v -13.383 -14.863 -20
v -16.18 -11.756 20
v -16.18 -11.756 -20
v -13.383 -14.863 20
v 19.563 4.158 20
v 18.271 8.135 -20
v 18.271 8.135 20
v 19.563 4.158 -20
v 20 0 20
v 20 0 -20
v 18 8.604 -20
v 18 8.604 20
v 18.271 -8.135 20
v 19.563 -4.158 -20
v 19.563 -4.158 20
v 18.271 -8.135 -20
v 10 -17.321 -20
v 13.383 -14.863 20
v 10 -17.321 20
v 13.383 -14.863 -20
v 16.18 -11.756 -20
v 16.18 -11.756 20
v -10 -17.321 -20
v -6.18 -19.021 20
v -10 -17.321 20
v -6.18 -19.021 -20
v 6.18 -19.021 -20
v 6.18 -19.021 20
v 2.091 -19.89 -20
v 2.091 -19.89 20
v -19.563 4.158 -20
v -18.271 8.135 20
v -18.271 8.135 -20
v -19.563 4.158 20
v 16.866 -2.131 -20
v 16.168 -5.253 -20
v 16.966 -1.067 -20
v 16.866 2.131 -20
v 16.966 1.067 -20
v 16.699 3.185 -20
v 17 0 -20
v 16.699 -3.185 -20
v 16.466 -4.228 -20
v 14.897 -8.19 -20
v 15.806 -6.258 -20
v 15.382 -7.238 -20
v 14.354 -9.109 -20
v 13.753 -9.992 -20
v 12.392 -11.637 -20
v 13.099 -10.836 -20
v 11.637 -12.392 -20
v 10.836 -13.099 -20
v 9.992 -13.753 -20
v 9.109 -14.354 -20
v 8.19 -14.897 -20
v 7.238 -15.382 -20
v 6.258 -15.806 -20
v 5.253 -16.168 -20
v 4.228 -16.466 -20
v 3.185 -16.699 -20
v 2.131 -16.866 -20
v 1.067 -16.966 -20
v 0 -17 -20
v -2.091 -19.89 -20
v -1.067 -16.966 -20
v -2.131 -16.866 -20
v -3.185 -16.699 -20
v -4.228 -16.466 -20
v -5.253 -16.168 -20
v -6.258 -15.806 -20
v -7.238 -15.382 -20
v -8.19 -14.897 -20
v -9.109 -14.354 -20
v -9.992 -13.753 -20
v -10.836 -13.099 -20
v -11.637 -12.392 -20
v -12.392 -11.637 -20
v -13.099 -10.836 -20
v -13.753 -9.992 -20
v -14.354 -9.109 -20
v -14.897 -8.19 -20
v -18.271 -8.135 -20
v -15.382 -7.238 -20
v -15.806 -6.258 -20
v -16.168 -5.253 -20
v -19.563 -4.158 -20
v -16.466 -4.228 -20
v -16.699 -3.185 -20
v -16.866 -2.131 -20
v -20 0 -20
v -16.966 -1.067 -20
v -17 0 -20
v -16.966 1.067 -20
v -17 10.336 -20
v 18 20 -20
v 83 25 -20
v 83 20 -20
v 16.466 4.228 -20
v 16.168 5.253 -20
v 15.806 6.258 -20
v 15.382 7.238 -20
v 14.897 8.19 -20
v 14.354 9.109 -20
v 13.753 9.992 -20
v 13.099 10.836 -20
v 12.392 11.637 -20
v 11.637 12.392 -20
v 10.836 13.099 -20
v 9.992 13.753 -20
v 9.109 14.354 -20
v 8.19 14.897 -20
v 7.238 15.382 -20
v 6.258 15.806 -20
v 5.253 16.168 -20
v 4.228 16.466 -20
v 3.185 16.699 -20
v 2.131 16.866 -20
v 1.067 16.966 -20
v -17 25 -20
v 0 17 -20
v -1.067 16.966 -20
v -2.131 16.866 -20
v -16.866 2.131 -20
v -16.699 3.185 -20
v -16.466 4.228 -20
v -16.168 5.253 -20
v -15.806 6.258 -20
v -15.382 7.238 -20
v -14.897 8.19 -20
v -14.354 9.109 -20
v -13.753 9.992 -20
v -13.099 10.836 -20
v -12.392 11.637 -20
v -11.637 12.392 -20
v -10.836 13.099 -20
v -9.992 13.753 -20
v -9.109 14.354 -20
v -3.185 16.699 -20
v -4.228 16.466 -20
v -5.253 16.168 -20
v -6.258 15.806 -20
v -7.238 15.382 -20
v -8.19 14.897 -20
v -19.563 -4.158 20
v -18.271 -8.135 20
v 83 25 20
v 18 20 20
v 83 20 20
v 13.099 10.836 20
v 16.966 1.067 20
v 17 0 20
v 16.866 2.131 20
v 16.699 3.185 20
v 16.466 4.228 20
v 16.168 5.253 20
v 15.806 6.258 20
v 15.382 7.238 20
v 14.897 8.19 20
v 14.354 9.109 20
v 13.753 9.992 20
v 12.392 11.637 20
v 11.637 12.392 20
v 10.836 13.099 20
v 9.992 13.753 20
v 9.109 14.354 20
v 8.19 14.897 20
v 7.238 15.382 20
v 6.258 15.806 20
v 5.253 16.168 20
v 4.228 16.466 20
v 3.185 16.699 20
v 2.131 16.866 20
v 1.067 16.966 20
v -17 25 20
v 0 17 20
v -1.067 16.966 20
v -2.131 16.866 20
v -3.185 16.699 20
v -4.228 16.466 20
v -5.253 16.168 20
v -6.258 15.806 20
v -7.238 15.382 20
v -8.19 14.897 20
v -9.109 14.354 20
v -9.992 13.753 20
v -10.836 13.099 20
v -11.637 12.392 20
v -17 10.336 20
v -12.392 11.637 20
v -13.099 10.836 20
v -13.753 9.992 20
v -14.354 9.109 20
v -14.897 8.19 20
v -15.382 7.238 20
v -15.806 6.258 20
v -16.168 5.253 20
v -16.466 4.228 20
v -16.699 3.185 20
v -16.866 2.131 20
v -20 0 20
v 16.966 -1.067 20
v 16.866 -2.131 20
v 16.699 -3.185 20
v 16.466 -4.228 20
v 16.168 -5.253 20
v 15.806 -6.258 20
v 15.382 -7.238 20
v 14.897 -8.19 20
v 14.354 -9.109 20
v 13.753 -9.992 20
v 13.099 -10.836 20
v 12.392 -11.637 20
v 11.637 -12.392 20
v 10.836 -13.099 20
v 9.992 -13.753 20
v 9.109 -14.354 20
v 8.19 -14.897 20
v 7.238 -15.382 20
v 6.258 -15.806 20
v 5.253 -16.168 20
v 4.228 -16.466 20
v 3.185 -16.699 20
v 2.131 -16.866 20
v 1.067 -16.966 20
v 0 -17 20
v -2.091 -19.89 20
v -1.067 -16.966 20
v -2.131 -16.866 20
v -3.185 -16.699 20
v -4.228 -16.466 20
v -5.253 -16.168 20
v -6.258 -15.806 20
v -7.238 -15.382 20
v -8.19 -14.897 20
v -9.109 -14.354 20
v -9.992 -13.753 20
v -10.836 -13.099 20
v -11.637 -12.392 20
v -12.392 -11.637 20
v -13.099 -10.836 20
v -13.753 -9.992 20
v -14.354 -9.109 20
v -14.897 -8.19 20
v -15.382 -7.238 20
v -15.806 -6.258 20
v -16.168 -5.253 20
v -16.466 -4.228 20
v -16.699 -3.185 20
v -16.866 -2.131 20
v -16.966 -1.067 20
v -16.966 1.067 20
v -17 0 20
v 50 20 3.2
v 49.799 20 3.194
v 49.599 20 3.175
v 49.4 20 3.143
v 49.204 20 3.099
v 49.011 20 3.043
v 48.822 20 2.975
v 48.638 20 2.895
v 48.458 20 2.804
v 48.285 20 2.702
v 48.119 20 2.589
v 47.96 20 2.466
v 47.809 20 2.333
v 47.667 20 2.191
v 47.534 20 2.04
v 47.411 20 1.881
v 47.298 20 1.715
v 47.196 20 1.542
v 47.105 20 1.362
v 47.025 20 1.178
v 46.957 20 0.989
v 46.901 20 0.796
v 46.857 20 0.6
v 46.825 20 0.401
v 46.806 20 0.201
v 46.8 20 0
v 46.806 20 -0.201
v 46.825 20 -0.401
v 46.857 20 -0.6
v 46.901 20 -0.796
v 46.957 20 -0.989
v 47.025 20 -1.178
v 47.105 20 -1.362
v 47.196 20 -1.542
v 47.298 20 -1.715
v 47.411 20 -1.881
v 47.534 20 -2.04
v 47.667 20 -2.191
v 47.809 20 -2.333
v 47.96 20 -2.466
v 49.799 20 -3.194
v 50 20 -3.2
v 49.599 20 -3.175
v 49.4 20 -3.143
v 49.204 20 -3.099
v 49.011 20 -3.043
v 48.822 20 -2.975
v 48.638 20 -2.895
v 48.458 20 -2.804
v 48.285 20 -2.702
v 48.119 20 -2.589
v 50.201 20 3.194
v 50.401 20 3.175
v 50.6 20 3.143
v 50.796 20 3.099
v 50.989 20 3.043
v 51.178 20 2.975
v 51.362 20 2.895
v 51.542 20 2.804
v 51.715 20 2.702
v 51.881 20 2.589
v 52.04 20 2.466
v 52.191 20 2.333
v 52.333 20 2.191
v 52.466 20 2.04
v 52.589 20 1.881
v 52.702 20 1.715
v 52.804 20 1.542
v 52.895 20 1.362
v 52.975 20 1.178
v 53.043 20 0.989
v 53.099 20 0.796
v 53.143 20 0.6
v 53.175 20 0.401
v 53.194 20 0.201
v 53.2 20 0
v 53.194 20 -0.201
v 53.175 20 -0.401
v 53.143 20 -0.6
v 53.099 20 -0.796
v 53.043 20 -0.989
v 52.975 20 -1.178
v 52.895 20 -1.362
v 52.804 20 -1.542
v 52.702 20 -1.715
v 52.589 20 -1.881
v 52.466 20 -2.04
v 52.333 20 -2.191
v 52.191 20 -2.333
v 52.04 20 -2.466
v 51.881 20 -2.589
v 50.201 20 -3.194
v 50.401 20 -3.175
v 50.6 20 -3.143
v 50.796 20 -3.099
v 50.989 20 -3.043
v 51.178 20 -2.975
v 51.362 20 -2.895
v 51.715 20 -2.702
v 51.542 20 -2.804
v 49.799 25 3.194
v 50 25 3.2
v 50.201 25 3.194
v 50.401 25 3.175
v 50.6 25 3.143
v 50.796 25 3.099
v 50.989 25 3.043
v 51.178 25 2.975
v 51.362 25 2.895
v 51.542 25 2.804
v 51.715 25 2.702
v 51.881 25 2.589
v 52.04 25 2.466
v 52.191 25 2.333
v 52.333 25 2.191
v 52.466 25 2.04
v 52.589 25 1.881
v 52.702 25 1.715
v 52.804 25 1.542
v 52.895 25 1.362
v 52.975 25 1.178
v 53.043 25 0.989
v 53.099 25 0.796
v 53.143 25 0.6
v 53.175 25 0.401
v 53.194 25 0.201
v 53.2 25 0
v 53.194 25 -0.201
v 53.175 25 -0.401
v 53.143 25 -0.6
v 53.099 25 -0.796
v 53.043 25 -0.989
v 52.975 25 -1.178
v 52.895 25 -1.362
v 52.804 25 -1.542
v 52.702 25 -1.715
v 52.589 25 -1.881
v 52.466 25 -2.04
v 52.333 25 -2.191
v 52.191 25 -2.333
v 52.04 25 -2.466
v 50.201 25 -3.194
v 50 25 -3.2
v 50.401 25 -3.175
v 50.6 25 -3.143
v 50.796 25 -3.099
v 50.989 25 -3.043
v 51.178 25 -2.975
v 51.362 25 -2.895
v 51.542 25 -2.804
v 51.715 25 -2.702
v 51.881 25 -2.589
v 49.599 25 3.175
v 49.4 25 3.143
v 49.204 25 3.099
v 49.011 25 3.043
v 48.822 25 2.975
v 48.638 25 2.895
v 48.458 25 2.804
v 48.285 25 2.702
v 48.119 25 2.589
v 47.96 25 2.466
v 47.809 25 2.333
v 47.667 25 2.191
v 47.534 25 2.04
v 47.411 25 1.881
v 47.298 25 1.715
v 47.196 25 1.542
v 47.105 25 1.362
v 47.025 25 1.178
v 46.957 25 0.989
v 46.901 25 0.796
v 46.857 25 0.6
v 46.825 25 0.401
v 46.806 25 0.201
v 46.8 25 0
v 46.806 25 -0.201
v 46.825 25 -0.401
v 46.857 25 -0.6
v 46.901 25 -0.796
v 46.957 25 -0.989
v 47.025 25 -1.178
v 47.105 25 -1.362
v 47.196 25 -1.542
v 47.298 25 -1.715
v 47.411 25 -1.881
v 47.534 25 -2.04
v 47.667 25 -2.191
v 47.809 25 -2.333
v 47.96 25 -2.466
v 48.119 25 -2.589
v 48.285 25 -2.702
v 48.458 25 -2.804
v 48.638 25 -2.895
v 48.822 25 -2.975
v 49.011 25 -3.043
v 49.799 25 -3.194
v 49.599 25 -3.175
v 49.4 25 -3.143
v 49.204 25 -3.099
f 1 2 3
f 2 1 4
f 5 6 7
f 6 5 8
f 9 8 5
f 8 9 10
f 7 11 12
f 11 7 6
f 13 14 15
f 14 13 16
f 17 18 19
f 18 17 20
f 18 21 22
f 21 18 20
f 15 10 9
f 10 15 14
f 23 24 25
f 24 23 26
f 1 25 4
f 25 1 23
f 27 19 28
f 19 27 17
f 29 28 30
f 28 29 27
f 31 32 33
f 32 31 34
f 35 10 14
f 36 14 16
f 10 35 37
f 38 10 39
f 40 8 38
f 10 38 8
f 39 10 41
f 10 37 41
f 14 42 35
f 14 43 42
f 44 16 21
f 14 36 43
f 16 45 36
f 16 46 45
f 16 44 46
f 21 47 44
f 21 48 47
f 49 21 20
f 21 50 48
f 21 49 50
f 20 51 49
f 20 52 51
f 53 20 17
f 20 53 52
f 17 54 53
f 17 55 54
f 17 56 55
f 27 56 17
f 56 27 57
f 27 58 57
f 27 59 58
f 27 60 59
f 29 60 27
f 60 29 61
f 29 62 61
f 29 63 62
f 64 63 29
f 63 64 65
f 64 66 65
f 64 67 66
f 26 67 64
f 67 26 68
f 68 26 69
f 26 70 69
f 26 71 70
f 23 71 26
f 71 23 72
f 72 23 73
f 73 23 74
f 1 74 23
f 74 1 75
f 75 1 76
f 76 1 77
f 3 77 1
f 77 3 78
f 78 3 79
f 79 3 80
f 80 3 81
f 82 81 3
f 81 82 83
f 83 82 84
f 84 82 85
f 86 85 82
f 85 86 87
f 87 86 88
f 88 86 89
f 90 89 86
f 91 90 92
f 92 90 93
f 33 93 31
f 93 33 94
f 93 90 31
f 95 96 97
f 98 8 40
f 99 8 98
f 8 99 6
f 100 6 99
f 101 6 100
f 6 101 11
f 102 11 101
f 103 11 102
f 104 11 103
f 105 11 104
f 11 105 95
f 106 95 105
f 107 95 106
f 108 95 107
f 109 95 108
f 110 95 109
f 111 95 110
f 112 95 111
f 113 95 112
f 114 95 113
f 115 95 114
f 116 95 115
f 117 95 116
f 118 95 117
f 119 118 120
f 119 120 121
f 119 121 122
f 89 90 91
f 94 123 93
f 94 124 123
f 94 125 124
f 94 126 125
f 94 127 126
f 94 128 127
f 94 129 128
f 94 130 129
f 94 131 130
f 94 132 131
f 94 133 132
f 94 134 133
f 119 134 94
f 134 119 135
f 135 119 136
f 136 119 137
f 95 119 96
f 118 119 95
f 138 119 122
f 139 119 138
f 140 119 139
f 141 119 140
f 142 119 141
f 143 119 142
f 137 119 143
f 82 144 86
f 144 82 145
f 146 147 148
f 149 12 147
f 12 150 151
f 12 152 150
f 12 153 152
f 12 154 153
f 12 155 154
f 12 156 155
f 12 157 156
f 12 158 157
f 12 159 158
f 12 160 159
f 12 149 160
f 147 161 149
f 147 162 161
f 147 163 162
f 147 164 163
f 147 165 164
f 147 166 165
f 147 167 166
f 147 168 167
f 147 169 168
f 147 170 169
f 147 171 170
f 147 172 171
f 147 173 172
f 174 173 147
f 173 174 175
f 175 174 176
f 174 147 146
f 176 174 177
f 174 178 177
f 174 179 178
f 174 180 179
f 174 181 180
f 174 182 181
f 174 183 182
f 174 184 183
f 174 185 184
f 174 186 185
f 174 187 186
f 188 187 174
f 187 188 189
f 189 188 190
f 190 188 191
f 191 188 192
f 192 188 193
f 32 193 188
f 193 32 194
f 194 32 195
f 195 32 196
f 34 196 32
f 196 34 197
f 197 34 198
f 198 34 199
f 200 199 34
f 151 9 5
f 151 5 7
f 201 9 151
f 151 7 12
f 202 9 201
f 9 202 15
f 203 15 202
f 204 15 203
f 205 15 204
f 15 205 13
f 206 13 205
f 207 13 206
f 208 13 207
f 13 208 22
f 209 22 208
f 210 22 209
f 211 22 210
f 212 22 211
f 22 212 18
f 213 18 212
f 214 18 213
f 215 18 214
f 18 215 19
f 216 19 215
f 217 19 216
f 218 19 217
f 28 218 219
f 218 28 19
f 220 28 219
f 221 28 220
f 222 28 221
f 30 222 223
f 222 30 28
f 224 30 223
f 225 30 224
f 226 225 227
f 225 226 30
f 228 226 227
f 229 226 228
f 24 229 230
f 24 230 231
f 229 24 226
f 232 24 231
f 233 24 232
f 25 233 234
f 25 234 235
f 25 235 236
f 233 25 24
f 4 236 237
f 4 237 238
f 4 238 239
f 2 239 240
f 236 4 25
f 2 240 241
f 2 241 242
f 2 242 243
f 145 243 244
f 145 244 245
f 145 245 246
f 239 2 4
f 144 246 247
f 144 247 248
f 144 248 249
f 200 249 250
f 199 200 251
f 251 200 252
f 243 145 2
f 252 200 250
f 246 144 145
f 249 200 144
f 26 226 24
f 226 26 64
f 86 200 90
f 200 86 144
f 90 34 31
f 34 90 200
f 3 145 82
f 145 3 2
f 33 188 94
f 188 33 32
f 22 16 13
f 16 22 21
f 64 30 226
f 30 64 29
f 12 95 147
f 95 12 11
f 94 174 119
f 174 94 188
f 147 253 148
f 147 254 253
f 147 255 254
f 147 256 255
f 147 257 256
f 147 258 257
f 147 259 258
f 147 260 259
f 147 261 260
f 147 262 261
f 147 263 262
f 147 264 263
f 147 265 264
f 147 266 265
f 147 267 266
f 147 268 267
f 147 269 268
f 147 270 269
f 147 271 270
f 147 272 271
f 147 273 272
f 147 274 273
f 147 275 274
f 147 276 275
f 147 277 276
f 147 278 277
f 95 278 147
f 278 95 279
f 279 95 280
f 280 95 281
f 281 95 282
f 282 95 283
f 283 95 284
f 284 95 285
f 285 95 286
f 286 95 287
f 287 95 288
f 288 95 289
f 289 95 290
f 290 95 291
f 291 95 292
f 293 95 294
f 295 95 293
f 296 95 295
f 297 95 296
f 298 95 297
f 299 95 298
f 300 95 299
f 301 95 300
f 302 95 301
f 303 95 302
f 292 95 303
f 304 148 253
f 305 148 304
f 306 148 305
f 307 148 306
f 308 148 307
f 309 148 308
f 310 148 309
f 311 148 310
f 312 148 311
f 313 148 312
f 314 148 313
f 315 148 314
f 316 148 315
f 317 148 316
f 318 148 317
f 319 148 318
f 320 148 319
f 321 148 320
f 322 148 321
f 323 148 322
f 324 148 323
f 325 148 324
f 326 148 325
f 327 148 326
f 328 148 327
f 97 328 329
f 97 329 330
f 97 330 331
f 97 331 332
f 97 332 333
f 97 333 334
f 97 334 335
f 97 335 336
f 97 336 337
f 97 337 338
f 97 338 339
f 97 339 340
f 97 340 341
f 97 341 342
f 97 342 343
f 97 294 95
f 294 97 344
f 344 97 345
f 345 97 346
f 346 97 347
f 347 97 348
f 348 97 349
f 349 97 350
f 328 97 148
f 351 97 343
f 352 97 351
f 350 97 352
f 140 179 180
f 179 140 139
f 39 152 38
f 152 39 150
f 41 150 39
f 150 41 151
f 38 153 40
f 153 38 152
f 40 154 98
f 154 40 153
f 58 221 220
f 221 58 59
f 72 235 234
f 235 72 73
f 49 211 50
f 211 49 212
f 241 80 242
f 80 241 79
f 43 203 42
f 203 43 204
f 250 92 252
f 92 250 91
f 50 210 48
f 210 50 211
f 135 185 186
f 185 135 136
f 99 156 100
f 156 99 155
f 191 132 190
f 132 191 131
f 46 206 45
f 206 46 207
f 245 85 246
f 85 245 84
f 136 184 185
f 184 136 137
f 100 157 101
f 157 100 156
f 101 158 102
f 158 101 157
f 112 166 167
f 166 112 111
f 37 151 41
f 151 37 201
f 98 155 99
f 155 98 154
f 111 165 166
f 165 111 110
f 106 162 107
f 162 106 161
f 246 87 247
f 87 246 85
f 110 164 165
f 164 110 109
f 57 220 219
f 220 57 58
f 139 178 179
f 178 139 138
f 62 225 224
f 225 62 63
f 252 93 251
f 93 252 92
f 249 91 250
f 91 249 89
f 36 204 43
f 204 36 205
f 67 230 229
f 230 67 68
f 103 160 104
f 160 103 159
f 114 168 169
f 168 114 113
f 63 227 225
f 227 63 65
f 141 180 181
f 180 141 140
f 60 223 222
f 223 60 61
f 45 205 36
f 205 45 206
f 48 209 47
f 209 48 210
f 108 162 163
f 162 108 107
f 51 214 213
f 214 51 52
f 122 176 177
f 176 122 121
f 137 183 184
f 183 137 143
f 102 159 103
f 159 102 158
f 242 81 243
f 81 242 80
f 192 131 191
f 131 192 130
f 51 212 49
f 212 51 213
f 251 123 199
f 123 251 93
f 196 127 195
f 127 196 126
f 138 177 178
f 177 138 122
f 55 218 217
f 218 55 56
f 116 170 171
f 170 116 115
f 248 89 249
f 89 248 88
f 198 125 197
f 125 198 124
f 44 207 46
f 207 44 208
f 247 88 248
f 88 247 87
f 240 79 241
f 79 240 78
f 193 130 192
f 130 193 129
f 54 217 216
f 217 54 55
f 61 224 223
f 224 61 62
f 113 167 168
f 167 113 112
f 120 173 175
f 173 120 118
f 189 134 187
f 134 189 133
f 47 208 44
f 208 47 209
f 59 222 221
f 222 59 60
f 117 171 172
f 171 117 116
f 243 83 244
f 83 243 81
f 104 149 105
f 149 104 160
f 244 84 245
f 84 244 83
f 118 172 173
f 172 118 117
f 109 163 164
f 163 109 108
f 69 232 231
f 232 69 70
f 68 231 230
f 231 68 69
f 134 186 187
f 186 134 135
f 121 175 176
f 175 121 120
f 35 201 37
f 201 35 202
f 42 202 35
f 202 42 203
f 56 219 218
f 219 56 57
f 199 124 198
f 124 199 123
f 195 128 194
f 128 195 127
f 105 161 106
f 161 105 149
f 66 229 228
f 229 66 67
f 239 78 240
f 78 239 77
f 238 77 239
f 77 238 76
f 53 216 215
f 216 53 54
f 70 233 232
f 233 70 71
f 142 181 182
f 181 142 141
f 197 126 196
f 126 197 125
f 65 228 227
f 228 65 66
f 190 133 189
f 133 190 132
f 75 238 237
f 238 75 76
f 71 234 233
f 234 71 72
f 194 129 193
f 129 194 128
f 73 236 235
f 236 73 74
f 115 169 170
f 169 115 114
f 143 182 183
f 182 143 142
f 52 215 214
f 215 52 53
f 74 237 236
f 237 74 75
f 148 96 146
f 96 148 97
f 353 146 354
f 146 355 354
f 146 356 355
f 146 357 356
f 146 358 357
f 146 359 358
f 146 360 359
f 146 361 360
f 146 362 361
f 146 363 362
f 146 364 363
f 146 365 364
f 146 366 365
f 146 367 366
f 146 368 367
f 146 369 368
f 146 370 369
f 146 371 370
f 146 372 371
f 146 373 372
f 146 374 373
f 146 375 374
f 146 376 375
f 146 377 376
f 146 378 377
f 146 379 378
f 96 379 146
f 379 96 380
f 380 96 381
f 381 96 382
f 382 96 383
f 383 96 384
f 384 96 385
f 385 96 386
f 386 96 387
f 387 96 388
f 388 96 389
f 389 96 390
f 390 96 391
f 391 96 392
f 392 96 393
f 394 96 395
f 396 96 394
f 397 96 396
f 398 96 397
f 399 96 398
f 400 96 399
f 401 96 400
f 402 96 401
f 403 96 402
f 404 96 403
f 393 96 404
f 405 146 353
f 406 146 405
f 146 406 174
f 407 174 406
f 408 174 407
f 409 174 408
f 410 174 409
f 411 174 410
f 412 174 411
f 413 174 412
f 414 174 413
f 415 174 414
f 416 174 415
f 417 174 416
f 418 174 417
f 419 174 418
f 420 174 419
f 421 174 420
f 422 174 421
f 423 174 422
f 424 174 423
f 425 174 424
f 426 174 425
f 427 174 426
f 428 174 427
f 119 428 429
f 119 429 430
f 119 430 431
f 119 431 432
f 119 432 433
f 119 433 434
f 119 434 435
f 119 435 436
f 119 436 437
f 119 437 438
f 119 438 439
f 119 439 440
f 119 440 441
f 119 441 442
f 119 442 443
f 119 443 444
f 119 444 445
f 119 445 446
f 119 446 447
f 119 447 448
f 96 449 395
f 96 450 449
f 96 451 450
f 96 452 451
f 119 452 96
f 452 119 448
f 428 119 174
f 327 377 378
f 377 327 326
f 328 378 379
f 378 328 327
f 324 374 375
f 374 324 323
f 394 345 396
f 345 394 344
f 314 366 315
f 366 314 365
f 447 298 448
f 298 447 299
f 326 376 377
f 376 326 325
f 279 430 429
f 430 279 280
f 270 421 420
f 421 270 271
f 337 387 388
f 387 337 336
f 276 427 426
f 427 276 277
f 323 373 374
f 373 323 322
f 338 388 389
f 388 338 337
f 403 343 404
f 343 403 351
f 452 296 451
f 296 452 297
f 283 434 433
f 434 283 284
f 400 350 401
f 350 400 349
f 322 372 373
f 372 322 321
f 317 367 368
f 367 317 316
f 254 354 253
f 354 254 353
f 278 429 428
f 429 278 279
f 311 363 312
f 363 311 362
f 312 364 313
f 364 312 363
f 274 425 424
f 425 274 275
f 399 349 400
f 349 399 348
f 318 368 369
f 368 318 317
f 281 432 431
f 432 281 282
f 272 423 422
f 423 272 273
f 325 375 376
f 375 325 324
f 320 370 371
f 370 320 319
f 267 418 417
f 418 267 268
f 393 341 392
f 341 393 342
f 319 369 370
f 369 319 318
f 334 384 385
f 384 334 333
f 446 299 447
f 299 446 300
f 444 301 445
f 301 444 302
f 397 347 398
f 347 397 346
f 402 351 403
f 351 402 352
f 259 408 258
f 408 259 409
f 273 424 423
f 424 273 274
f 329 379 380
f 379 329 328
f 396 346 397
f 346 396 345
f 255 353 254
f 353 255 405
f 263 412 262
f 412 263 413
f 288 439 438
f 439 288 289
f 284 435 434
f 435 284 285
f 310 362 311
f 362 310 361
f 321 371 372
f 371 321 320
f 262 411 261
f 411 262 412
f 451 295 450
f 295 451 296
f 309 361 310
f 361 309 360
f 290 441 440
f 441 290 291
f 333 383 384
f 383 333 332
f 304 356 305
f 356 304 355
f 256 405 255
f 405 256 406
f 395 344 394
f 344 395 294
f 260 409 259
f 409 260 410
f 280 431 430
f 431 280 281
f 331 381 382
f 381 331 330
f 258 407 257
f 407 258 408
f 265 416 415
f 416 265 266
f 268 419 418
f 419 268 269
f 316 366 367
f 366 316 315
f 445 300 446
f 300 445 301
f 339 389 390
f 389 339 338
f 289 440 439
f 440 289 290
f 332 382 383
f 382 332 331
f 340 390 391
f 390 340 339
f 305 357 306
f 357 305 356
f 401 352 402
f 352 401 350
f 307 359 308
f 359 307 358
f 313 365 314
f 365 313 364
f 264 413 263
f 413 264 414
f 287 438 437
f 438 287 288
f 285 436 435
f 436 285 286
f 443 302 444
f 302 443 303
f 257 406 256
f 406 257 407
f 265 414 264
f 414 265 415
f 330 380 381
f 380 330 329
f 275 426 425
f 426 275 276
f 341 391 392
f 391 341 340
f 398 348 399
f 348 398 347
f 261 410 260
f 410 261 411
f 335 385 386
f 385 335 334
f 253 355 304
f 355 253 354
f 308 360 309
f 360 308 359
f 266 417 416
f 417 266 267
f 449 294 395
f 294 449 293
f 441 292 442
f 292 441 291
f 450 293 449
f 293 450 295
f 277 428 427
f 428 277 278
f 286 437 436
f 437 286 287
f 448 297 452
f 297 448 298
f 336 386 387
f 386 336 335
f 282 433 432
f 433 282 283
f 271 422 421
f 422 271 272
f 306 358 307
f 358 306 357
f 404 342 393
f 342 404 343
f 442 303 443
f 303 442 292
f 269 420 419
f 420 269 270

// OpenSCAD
difference(){
    mount();
    translate([0,0,-25]){
        cylinder(50, 17, 17, $fn=100);
    }
    
    


}


difference(){
    translate([-17,20,-20]){
    cube([100,5,40]);
    }
    translate([50,40,0]){
        rotate([90,0,0]){
            cylinder(40, 3.2, 3.2, $fn=100);
        }
    }


}




module mount(){
    translate([0,0,-20]){
    cylinder(40,20, 20);
    } 
    translate([-17,00,-20]){
    cube([35,20,40]);
    }
    }
